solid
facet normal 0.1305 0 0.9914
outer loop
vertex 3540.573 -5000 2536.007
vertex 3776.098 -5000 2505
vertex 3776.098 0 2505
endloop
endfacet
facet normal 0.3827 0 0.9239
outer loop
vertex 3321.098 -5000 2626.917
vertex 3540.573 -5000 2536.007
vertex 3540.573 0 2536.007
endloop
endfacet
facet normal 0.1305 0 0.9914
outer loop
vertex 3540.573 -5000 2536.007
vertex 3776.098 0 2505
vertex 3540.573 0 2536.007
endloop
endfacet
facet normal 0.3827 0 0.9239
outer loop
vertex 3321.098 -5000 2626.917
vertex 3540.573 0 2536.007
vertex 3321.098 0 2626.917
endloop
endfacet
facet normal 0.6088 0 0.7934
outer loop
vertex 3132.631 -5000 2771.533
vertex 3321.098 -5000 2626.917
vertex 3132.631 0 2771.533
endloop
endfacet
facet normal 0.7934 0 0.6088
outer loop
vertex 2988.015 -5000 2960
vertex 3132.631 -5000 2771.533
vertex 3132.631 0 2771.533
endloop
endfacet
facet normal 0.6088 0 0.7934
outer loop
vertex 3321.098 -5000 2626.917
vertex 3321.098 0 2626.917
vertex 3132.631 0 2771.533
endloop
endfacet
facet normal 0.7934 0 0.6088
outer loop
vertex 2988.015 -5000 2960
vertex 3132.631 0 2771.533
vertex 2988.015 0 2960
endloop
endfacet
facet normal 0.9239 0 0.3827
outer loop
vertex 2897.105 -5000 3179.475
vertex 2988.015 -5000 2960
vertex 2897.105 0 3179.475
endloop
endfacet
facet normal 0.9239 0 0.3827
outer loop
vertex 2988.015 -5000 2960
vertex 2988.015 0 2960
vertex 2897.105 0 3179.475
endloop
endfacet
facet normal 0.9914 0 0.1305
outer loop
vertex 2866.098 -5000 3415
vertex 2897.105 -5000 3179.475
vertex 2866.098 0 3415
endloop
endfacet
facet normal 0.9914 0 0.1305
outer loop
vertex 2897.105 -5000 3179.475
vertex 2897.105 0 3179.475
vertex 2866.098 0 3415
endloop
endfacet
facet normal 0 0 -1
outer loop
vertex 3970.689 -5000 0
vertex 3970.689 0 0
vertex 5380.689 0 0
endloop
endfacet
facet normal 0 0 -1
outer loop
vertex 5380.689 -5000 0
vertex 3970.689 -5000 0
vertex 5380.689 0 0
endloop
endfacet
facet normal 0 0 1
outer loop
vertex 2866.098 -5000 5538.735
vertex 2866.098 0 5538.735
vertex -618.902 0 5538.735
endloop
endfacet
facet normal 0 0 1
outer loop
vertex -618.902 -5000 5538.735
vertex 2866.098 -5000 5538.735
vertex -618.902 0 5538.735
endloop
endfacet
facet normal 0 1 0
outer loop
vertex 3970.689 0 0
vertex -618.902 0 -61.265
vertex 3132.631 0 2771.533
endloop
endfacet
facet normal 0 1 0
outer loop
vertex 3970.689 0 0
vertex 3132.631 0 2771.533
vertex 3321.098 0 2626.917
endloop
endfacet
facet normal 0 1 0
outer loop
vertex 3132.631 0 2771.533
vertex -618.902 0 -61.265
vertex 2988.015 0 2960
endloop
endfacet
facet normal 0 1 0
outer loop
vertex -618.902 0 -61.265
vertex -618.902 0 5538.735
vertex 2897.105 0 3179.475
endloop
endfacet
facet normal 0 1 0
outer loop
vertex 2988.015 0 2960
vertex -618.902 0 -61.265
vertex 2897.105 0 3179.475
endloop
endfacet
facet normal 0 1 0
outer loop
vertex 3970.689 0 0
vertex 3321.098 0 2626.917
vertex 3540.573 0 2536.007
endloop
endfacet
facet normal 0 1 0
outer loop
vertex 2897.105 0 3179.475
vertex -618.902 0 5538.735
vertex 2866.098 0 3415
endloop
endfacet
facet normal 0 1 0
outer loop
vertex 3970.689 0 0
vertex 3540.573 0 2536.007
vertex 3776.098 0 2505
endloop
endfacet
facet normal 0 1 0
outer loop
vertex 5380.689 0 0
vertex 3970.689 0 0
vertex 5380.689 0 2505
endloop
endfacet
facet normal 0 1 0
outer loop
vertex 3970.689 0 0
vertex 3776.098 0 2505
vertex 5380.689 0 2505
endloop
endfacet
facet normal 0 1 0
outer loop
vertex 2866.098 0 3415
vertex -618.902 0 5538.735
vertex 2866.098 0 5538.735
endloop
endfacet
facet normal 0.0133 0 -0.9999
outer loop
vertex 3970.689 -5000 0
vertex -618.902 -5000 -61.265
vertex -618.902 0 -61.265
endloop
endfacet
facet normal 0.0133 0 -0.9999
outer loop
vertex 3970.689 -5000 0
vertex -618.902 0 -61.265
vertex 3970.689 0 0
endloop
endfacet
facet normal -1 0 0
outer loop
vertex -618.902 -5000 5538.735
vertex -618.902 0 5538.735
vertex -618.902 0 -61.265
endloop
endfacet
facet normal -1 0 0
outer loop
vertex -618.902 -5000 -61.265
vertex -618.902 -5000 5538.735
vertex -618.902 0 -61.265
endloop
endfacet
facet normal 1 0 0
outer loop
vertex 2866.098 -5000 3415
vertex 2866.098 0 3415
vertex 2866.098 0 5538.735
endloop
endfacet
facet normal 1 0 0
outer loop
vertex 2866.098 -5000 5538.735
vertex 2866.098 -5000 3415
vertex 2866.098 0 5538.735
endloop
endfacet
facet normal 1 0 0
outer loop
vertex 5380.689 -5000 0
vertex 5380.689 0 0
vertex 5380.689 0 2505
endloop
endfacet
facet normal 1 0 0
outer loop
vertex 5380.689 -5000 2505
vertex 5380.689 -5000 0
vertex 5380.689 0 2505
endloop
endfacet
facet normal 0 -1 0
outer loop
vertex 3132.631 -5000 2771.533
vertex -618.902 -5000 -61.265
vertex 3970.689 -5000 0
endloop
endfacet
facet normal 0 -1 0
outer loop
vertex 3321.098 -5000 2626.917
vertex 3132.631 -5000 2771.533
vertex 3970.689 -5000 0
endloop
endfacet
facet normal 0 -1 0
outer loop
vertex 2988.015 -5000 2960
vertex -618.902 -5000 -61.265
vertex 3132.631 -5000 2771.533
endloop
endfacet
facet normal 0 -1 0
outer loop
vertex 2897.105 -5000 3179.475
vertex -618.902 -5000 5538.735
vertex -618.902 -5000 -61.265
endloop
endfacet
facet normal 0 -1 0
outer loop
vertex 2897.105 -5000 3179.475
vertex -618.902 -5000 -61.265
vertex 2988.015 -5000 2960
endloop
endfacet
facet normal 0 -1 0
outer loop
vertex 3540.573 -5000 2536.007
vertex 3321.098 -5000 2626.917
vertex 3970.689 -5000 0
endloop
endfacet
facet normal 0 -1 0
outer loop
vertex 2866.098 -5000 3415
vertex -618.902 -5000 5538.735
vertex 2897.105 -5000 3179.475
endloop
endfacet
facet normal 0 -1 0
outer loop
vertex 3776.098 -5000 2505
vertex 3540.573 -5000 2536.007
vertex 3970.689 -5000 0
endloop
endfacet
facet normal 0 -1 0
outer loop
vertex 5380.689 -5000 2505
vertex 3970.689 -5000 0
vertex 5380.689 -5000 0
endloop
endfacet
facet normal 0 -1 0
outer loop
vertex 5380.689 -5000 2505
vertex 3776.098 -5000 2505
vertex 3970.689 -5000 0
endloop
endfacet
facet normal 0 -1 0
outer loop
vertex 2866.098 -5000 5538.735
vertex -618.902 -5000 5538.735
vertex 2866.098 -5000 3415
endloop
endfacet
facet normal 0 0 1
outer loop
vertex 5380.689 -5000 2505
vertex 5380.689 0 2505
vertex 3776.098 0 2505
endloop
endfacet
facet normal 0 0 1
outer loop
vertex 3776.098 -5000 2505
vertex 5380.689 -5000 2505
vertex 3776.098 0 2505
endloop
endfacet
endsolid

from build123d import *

# Parameters (mm, degrees)
F1_DEPTH = 5000


with BuildPart() as f1:
    # F0 (on Front) → F1 (new body)
    with BuildSketch(Plane.XZ):
        with BuildLine():
            Line((2866.097939, 5538.735365), (-618.902061, 5538.735365))
            Line((-618.902061, 5538.735365), (-618.902061, -61.264635))
            Line((-618.902061, -61.264635), (3970.689058, 0))
            Line((3970.689058, 0), (4880.689058, 0))
            Line((4880.689058, 0), (5380.689058, 0))
            Line((5380.689058, 0), (5380.689058, 2505))
            Line((5380.689058, 2505), (5090.689058, 2505))
            Line((5090.689058, 2505), (4800.689058, 2505))
            Line((4800.689058, 2505), (4510.689058, 2505))
            Line((4510.689058, 2505), (4288.393499, 2505))
            Line((4288.393499, 2505), (4220.689058, 2505))
            Line((4220.689058, 2505), (3776.097939, 2505))
            ThreePointArc((3776.097939, 2505), (3132.630768, 2771.532829), (2866.097939, 3415))
            Line((2866.097939, 3415), (2866.097939, 3798.735365))
            Line((2866.097939, 3798.735365), (2866.097939, 4088.735365))
            Line((2866.097939, 4088.735365), (2866.097939, 4378.735365))
            Line((2866.097939, 4378.735365), (2866.097939, 4668.735365))
            Line((2866.097939, 4668.735365), (2866.097939, 4958.735365))
            Line((2866.097939, 4958.735365), (2866.097939, 5248.735365))
            Line((2866.097939, 5248.735365), (2866.097939, 5538.735365))
        make_face()
    extrude(amount=F1_DEPTH)


solid = f1.part
